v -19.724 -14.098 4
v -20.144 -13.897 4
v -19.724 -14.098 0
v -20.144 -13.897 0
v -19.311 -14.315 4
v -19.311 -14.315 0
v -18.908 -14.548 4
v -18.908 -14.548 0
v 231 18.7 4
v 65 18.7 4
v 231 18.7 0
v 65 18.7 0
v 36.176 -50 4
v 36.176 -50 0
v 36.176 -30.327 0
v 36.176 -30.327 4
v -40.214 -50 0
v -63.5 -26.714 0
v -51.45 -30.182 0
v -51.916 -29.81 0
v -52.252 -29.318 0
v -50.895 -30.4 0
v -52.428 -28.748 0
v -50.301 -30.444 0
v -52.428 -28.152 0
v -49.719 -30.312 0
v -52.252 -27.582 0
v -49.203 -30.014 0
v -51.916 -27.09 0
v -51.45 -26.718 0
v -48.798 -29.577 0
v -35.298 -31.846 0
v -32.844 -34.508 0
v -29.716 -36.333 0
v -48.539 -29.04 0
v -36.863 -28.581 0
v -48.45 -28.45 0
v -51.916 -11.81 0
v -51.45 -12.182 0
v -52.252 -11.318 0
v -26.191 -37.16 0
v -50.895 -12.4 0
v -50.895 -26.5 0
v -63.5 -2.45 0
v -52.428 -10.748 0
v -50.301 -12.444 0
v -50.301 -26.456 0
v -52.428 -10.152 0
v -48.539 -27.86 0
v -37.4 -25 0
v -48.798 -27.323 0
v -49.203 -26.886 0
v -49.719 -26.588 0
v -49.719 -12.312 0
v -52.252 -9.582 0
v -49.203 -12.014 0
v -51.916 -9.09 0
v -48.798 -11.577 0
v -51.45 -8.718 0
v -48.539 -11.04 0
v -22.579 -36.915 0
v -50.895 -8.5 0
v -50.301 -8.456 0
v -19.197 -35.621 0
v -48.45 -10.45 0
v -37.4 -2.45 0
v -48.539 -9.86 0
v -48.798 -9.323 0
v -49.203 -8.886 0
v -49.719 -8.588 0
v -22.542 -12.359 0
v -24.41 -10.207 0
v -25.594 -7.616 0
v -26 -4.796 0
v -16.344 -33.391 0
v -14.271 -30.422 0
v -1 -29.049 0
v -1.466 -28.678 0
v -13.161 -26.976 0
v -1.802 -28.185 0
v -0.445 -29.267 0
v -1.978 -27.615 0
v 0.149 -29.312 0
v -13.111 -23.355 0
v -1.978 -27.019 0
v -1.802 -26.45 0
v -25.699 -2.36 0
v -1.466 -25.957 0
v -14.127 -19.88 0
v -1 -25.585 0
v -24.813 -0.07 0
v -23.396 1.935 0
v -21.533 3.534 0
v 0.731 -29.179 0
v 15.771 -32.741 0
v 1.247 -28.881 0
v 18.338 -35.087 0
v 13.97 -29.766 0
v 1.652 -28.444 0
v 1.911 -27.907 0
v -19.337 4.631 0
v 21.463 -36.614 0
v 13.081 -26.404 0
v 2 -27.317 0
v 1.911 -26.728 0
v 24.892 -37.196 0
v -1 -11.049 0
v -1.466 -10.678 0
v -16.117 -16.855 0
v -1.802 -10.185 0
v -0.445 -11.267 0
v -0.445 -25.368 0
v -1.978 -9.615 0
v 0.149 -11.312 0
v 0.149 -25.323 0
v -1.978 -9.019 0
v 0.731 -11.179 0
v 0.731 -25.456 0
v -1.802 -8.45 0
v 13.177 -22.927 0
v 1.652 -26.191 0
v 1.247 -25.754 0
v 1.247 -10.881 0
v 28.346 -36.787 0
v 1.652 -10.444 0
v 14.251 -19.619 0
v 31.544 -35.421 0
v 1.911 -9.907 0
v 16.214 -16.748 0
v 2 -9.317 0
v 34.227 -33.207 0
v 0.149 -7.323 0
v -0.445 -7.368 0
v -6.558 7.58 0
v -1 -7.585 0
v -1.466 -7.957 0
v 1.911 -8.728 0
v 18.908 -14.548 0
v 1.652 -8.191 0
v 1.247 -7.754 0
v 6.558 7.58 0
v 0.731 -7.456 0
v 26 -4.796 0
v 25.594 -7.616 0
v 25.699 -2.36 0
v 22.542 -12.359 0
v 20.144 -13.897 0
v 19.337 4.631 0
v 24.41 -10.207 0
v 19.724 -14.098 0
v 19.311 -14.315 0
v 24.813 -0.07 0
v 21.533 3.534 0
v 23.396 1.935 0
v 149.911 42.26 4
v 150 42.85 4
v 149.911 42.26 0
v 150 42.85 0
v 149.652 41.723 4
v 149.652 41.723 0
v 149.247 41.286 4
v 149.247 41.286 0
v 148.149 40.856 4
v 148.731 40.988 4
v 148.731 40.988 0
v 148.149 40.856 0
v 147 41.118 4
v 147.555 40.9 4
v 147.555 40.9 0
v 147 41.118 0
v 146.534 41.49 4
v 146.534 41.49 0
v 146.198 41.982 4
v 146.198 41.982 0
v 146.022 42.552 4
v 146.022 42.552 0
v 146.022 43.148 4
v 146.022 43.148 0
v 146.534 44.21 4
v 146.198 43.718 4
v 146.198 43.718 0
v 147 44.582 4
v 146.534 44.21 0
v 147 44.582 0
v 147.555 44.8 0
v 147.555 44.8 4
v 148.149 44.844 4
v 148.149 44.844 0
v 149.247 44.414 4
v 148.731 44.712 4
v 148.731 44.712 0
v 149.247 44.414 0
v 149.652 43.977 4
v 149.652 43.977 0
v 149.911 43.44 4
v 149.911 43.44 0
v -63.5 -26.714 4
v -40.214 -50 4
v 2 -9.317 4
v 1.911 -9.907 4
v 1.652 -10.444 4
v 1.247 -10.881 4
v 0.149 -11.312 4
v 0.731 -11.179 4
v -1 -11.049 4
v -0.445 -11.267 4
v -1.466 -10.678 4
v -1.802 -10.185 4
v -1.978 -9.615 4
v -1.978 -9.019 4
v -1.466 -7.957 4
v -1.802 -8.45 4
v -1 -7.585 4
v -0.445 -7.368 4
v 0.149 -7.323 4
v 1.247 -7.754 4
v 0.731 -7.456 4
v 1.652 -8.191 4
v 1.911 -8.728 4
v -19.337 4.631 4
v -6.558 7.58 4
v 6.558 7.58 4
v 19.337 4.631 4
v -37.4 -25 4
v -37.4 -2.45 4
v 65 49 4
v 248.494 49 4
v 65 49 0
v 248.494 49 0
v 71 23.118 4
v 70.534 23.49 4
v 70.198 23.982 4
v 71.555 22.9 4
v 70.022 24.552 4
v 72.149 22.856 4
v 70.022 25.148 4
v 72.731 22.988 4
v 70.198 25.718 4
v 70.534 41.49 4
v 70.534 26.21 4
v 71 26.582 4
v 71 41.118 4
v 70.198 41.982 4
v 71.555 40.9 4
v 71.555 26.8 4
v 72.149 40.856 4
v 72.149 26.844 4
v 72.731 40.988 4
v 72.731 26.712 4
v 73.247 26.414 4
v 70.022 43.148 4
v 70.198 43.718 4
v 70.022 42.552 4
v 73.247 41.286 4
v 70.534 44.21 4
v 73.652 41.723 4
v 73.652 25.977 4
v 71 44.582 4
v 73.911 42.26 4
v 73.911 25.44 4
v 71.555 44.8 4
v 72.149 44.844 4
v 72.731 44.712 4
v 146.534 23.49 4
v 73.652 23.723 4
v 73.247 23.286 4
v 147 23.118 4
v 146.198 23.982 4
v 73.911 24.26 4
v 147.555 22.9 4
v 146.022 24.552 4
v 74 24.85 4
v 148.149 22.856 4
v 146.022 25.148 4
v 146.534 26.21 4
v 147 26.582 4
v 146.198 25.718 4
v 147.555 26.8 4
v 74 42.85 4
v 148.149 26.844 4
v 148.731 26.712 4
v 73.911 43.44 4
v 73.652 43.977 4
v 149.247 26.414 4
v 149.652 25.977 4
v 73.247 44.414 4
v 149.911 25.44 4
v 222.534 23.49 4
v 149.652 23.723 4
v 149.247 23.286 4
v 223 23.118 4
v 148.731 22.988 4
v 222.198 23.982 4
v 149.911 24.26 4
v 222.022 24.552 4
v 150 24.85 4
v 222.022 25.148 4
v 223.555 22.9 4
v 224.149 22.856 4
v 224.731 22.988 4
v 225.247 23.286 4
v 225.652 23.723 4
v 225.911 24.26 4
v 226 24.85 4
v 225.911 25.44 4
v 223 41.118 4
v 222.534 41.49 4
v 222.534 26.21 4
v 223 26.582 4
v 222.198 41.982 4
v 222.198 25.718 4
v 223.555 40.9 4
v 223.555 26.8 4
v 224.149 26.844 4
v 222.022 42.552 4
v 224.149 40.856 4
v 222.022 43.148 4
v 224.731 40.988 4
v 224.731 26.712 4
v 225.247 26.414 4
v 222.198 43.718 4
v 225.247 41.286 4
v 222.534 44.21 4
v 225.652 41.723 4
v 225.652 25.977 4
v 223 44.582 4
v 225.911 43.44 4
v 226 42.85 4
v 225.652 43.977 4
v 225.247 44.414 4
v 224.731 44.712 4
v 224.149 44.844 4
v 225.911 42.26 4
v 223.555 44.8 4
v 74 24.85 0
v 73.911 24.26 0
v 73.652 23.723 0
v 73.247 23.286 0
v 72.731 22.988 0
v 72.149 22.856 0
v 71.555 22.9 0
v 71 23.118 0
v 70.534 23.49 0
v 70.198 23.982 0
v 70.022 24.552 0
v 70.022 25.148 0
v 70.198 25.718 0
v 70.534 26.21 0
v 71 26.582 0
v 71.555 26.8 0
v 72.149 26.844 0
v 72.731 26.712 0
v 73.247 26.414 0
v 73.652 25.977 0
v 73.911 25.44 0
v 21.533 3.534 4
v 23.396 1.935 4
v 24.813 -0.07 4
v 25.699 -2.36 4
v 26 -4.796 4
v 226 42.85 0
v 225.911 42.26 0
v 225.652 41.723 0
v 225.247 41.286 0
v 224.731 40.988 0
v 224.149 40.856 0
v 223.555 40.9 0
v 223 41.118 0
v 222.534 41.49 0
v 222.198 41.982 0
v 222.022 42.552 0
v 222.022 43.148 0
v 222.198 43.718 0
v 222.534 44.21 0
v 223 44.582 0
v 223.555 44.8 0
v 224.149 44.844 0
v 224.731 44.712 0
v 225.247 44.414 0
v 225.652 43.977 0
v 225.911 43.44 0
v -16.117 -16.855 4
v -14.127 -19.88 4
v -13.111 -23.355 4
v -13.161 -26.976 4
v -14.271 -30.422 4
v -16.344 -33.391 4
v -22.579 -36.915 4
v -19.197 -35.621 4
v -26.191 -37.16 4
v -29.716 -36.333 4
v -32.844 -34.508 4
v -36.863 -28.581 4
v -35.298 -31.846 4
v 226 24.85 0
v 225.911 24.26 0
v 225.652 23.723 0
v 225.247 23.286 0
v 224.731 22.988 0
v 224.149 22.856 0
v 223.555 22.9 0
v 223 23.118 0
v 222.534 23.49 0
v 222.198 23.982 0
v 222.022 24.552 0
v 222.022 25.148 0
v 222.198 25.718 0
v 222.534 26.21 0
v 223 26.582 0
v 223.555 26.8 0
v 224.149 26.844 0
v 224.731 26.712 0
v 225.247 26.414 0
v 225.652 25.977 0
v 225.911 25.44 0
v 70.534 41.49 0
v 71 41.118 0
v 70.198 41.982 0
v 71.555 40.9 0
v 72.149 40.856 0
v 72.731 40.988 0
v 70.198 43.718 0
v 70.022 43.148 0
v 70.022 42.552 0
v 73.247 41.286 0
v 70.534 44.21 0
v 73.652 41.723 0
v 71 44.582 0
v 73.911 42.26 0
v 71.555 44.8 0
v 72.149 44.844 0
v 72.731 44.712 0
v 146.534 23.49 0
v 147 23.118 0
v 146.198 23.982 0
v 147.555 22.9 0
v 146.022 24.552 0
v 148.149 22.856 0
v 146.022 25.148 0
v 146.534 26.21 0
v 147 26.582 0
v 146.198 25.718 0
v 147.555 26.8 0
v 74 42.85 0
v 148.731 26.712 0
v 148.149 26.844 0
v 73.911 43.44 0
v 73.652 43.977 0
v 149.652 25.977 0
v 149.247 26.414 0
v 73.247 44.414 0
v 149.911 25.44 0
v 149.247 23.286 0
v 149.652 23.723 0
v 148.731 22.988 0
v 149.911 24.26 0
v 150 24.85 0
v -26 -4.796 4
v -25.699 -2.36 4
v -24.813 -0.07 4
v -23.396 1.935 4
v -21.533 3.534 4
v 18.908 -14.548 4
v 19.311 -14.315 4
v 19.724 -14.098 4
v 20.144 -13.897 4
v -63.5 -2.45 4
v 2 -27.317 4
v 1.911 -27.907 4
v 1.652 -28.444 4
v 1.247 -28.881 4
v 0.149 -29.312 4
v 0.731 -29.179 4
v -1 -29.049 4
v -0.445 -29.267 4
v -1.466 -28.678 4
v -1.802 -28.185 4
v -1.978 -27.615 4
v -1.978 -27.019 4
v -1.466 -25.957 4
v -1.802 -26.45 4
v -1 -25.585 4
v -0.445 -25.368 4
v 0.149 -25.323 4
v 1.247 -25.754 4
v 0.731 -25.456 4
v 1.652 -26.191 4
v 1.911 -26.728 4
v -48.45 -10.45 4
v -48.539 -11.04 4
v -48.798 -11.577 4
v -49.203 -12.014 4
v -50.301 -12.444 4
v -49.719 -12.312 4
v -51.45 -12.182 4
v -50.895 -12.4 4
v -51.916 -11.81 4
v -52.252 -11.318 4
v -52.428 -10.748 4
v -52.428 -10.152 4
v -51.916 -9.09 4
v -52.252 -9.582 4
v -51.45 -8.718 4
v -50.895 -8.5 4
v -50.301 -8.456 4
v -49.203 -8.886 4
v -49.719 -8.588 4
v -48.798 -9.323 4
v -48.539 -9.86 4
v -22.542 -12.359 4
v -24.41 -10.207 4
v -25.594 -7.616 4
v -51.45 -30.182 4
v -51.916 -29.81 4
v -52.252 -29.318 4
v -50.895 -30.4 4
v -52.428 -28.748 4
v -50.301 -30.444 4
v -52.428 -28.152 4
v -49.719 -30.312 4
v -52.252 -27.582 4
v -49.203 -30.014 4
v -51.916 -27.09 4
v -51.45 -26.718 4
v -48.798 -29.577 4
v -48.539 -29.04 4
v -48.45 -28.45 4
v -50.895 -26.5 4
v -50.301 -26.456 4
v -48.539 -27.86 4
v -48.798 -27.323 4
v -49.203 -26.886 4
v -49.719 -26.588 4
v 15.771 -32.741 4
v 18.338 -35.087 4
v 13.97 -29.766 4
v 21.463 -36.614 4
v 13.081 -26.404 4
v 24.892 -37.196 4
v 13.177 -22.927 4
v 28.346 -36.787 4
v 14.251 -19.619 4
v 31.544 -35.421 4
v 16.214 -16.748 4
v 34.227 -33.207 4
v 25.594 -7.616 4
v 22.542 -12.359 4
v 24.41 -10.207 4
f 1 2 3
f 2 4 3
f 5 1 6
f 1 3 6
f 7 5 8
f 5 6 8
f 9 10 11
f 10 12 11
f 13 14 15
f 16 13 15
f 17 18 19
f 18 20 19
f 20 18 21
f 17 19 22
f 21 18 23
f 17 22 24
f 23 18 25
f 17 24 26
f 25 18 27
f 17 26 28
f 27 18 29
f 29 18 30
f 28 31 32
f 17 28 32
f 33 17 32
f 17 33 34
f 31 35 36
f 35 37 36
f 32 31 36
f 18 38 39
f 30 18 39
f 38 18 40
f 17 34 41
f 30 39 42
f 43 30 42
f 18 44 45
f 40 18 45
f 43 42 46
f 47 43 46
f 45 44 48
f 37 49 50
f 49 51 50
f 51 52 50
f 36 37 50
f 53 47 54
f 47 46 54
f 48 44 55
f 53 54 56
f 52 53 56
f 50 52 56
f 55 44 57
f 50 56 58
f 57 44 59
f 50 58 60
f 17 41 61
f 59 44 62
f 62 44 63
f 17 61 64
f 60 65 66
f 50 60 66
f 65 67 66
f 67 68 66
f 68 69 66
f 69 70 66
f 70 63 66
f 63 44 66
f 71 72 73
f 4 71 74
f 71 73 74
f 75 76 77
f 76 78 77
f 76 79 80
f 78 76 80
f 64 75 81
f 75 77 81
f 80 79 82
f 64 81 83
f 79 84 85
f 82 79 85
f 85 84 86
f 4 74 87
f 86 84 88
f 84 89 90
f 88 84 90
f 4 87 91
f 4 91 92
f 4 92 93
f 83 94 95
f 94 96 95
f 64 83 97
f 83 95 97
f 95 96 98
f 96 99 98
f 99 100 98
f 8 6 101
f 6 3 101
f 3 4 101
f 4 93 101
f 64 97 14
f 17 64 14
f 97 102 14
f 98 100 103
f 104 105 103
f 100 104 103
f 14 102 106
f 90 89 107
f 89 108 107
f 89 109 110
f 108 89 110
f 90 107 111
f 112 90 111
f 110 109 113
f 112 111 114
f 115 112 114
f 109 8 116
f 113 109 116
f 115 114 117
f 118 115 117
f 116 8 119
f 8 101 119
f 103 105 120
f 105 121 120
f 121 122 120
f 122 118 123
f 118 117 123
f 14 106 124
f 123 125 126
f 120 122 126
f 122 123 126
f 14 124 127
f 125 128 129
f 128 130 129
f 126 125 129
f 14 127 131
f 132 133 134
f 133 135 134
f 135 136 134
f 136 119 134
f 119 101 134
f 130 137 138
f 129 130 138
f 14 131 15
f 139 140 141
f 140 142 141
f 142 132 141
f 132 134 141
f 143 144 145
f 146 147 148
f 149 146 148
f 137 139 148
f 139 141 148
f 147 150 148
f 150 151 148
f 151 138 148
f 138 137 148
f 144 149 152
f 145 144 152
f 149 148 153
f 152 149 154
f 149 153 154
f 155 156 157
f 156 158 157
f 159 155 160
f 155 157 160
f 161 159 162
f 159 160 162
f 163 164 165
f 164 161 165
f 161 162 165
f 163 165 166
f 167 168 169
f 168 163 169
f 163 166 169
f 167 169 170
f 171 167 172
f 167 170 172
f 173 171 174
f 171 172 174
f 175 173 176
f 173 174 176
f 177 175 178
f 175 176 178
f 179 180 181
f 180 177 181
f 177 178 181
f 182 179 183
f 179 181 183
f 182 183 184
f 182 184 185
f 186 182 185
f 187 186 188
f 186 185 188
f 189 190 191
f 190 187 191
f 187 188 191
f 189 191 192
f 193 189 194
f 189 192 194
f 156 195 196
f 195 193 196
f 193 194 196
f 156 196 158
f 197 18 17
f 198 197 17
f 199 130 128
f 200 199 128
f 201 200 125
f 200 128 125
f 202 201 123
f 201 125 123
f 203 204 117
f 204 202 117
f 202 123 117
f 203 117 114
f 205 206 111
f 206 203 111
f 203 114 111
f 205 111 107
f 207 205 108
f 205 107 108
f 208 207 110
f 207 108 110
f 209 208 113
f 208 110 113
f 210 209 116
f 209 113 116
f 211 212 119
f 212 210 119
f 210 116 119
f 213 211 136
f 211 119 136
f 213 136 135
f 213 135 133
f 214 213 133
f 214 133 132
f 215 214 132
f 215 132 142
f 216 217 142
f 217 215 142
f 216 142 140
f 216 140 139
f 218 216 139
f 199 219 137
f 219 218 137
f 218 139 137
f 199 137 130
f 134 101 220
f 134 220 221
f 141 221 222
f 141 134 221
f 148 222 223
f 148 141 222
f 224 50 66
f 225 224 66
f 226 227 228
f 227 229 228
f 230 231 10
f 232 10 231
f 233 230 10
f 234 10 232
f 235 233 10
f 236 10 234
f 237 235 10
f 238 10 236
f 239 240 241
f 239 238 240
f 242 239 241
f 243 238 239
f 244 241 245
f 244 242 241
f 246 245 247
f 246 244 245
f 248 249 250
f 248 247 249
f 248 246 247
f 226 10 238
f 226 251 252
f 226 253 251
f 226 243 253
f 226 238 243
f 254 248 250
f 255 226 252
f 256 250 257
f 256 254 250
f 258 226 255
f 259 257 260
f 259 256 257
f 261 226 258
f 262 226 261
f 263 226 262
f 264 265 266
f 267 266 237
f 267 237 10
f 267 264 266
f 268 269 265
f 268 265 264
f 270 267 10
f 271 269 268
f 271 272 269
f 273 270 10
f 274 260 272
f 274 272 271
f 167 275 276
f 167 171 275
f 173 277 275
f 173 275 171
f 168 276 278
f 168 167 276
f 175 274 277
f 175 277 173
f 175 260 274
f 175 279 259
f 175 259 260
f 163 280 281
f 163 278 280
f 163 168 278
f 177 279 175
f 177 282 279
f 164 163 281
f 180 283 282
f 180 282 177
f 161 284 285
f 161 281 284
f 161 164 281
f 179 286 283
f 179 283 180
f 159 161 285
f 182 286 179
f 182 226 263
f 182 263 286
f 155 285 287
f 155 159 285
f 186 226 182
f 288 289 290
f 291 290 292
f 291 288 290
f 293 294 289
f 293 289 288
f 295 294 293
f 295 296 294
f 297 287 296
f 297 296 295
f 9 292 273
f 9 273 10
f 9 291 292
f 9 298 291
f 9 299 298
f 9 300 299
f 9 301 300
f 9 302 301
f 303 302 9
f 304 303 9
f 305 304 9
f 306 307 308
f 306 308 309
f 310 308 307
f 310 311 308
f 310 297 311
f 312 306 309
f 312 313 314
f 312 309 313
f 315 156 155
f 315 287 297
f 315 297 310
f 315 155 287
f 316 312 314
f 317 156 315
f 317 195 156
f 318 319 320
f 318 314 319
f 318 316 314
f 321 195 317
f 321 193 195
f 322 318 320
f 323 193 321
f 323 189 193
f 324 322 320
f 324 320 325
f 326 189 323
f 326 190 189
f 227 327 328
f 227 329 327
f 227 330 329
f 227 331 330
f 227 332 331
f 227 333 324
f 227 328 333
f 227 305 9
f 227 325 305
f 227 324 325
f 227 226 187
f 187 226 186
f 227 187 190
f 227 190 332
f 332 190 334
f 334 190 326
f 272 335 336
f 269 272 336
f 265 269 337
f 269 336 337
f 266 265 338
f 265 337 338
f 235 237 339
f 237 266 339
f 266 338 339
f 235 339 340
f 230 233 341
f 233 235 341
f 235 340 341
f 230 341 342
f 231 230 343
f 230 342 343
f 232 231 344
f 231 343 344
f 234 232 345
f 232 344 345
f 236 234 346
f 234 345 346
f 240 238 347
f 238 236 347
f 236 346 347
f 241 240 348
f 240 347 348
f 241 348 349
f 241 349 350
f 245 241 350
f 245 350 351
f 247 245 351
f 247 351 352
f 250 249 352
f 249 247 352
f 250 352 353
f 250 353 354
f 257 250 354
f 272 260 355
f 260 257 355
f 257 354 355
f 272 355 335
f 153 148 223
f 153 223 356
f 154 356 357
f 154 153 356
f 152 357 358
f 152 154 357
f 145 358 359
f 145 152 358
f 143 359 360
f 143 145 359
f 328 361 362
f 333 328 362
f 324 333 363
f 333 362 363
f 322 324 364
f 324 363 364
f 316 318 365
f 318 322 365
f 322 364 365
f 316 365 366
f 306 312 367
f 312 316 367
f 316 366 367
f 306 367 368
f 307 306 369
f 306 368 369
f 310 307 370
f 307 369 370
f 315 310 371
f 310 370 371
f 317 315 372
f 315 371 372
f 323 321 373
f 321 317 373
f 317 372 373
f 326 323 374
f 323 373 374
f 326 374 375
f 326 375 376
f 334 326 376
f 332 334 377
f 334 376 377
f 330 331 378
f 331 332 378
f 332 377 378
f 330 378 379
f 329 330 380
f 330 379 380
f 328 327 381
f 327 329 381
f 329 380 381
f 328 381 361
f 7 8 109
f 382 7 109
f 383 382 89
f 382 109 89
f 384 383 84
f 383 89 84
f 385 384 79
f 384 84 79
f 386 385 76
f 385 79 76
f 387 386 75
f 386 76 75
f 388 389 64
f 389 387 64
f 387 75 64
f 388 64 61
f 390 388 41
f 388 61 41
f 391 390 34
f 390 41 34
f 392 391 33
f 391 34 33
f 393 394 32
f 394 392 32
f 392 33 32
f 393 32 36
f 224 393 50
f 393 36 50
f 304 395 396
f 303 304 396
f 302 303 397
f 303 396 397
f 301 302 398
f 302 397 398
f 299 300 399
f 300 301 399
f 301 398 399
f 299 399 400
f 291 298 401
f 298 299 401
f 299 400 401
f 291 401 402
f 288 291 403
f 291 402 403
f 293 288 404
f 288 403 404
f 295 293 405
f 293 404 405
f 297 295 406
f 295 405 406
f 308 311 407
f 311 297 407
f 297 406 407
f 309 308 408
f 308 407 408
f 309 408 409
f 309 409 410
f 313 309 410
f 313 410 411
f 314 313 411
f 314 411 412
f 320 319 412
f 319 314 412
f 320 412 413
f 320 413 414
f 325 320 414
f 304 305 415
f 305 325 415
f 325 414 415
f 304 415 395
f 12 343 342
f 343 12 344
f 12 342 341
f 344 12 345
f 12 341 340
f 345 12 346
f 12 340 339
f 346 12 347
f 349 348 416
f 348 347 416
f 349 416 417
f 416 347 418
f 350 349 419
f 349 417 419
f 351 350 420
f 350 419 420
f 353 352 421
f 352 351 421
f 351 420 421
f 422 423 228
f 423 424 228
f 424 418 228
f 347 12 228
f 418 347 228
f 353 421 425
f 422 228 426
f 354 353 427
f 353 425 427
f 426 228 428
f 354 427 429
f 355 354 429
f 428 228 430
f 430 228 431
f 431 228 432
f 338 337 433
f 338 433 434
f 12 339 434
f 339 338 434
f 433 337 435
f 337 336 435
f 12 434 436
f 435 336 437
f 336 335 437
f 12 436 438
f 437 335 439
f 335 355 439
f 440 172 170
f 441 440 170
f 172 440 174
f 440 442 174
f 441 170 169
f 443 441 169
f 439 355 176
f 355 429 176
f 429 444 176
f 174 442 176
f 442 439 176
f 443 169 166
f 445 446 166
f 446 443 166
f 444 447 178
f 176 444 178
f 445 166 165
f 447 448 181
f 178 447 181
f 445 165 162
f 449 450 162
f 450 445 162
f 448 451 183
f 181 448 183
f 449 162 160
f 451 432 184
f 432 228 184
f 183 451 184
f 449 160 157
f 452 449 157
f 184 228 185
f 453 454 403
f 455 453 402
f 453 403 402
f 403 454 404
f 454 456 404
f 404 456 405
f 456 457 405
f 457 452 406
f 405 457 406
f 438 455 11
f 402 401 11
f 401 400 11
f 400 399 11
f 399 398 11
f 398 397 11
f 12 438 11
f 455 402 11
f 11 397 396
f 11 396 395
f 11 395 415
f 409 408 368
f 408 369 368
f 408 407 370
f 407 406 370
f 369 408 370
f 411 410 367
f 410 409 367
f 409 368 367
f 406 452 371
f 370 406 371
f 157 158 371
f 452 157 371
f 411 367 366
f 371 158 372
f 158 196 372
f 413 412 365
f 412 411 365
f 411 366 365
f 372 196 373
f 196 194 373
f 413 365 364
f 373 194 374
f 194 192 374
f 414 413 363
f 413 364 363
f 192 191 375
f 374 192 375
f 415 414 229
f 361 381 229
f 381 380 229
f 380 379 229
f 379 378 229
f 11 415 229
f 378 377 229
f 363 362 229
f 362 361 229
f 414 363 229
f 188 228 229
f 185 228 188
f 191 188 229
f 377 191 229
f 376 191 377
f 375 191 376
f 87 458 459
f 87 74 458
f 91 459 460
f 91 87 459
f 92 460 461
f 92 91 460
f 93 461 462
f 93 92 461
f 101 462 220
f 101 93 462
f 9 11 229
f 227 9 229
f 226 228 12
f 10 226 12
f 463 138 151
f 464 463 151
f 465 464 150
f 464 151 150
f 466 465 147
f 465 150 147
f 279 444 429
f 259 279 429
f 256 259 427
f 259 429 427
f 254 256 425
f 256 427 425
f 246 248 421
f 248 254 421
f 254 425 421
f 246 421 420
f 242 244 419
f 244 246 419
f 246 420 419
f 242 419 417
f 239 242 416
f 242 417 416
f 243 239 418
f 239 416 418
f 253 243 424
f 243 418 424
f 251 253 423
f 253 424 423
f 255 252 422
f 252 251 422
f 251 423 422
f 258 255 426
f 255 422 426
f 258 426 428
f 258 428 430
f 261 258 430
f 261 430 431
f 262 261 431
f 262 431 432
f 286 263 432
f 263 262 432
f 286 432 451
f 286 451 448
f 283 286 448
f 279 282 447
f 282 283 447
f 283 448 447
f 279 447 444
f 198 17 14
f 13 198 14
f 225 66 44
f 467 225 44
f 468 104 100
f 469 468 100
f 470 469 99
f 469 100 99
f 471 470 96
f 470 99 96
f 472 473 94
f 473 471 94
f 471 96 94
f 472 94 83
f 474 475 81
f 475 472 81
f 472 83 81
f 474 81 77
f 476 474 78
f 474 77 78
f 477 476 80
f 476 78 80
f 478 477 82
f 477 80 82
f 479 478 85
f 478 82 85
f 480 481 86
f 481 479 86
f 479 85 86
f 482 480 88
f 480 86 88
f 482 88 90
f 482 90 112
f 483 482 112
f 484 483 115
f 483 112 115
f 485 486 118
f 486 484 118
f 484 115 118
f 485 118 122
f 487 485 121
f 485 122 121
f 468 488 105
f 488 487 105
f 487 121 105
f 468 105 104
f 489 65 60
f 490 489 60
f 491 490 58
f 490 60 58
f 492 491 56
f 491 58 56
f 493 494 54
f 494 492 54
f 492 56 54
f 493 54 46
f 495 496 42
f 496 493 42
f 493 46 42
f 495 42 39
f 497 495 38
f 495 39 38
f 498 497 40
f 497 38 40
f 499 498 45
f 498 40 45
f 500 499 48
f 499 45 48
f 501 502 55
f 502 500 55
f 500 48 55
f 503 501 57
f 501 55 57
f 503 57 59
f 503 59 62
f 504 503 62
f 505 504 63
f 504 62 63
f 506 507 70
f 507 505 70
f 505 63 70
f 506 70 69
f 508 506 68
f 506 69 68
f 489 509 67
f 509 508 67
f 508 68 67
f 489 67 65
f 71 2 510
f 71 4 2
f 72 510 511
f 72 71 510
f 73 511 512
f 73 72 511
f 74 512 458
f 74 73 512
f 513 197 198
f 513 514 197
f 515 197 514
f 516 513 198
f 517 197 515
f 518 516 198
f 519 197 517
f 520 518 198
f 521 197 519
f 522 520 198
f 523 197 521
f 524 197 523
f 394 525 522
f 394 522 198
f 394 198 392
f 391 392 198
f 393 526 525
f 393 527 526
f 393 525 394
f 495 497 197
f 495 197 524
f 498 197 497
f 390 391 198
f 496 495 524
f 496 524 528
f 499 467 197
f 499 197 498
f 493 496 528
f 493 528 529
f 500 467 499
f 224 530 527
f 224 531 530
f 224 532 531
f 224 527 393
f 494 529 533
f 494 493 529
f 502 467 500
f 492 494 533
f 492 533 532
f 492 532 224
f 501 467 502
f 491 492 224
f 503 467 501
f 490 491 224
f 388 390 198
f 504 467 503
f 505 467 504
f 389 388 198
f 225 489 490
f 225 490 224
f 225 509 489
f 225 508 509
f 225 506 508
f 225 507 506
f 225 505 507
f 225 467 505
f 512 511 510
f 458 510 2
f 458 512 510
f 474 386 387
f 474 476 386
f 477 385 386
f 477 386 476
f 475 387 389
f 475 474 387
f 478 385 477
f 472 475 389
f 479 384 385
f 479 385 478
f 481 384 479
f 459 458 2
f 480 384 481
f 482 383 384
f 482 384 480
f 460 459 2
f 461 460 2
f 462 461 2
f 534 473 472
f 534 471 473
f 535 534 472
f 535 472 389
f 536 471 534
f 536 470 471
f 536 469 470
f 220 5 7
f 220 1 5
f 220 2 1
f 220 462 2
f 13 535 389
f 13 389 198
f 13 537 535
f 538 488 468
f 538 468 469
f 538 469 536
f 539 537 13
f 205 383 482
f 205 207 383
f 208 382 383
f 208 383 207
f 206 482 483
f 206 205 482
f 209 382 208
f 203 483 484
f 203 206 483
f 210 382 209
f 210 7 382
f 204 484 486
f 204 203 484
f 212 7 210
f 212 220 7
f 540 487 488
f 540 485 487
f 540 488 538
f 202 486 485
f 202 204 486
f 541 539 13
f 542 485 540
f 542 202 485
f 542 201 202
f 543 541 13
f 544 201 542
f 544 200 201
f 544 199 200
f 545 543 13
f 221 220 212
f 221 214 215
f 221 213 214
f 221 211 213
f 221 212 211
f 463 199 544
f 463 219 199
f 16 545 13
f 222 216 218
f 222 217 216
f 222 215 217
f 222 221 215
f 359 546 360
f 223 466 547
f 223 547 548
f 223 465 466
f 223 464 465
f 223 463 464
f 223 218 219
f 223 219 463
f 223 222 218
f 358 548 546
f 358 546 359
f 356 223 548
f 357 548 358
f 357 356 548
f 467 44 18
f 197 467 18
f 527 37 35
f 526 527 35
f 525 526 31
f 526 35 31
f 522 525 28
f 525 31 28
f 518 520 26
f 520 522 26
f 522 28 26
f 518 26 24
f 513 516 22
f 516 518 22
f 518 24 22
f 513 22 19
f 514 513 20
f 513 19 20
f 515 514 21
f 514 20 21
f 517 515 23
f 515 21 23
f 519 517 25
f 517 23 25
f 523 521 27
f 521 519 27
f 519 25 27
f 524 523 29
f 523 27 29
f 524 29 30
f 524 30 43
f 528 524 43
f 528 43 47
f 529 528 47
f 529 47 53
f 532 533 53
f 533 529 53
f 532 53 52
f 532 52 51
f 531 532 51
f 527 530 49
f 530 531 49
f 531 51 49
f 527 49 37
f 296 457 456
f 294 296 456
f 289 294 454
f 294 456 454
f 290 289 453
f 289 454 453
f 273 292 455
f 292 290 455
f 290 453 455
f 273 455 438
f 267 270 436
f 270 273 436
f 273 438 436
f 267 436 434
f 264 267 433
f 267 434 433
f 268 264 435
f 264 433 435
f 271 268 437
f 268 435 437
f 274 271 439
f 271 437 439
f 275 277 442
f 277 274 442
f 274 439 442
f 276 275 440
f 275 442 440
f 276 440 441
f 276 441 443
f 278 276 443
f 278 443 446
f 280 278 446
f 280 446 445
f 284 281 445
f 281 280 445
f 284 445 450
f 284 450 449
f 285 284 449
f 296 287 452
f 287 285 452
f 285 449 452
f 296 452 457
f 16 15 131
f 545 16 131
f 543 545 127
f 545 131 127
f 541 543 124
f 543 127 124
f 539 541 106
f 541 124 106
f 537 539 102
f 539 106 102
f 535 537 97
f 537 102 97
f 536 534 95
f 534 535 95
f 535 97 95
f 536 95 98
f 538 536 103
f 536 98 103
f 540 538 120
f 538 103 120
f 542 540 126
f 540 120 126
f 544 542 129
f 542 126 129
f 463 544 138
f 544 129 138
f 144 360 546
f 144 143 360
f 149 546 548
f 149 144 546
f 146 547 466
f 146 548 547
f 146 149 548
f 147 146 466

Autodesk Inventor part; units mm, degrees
ref_plane "YZ Plane" through (0, 0, 0) normal (1, 0, 0) x (0, 1, 0)
ref_plane "XZ Plane" through (0, 0, 0) normal (0, 1, 0) x (-1, 0, 0)
ref_plane "XY Plane" through (0, 0, 0) normal (0, 0, 1) x (1, 0, 0)
sketch "Boceto1" plane through (0, 0, 0) normal (0, 0, 1) x (1, 0, 0)
  circle A0 centre (224, 42.85) radius 2 projected
  circle A1 centre (72, 42.85) radius 2 projected
  circle A2 centre (0, -9.3174) radius 2 projected
  circle A3 centre (-50.45, -10.45) radius 2 projected
  circle A4 centre (224, 24.85) radius 2 projected
  circle A5 centre (72, 24.85) radius 2 projected
  circle A6 centre (0, -27.3174) radius 2 projected
  circle A7 centre (-50.45, -28.45) radius 2 projected
  arc A8 (18.9077, -14.5479) -> (36.1757, -30.3268) centre (25.2, -25) ccw projected
  arc A9 (-37.4, -25) -> (-18.9077, -14.5479) centre (-25.2, -25) ccw projected
  arc A10 (20.1441, -13.8969) -> (26, -4.796) centre (16, -4.796) ccw projected
  arc A11 (-26, -4.796) -> (-20.1441, -13.8969) centre (-16, -4.796) ccw projected
  arc A12 (20.1441, -13.8969) -> (18.9077, -14.5479) centre (25.2, -25) ccw
  arc A13 (-18.9077, -14.5479) -> (-20.1441, -13.8969) centre (-25.2, -25) ccw
  arc A14 (-19.3367, 4.6309) -> (-26, -4.796) centre (-16, -4.796) ccw
  arc A15 (19.3367, 4.6309) -> (-19.3367, 4.6309) centre (0, -50) ccw
  arc A16 (26, -4.796) -> (19.3367, 4.6309) centre (16, -4.796) ccw
  line L0 (-37.4, -25) -> (-37.4, -2.45)
  line L1 (-37.4, -2.45) -> (-63.5, -2.45)
  line L2 (-63.5, -2.45) -> (-63.5, -26.7137)
  line L3 (-40.2137, -50) -> (36.1757, -50)
  line L4 (36.1757, -50) -> (36.1757, -30.3268)
  line L5 (-63.5, -26.7137) -> (-40.2137, -50)
  line L6 (276.8, -56) -> (-78.2, -56) projected
  circle A17 centre (148, 42.85) radius 2 projected
  circle A18 centre (148, 24.85) radius 2 projected
  line L7 (248.4937, 49) -> (65, 49)
  line L8 (65, 49) -> (65, 18.7)
  line L9 (65, 18.7) -> (231, 18.7)
  line L10 (231, 18.7) -> (248.4937, 49)
  line L11 (-78.2, 56) -> (276.8, 56) projected
  line L12 (72, 24.85) -> (72, 42.85) construction
  point P0 (0, 0)
  point P1 (-50.45, -2.45)
  point P2 (72, 33.85)
  point P3 (65, 33.85)
  point P4 (148, 18.7)
  dimension "d0" = 13.05
  dimension "d1" = 45
  dimension "d2" = 6
  dimension "d3" = 8
  dimension "d4" = 6
  dimension "d5" = 7
  dimension "d6" = 120
  dimension "d7" = 5
extrude "Extrusión1" add sketch "Boceto1" along normal blind 4
properties part number "cierre carcasa"
